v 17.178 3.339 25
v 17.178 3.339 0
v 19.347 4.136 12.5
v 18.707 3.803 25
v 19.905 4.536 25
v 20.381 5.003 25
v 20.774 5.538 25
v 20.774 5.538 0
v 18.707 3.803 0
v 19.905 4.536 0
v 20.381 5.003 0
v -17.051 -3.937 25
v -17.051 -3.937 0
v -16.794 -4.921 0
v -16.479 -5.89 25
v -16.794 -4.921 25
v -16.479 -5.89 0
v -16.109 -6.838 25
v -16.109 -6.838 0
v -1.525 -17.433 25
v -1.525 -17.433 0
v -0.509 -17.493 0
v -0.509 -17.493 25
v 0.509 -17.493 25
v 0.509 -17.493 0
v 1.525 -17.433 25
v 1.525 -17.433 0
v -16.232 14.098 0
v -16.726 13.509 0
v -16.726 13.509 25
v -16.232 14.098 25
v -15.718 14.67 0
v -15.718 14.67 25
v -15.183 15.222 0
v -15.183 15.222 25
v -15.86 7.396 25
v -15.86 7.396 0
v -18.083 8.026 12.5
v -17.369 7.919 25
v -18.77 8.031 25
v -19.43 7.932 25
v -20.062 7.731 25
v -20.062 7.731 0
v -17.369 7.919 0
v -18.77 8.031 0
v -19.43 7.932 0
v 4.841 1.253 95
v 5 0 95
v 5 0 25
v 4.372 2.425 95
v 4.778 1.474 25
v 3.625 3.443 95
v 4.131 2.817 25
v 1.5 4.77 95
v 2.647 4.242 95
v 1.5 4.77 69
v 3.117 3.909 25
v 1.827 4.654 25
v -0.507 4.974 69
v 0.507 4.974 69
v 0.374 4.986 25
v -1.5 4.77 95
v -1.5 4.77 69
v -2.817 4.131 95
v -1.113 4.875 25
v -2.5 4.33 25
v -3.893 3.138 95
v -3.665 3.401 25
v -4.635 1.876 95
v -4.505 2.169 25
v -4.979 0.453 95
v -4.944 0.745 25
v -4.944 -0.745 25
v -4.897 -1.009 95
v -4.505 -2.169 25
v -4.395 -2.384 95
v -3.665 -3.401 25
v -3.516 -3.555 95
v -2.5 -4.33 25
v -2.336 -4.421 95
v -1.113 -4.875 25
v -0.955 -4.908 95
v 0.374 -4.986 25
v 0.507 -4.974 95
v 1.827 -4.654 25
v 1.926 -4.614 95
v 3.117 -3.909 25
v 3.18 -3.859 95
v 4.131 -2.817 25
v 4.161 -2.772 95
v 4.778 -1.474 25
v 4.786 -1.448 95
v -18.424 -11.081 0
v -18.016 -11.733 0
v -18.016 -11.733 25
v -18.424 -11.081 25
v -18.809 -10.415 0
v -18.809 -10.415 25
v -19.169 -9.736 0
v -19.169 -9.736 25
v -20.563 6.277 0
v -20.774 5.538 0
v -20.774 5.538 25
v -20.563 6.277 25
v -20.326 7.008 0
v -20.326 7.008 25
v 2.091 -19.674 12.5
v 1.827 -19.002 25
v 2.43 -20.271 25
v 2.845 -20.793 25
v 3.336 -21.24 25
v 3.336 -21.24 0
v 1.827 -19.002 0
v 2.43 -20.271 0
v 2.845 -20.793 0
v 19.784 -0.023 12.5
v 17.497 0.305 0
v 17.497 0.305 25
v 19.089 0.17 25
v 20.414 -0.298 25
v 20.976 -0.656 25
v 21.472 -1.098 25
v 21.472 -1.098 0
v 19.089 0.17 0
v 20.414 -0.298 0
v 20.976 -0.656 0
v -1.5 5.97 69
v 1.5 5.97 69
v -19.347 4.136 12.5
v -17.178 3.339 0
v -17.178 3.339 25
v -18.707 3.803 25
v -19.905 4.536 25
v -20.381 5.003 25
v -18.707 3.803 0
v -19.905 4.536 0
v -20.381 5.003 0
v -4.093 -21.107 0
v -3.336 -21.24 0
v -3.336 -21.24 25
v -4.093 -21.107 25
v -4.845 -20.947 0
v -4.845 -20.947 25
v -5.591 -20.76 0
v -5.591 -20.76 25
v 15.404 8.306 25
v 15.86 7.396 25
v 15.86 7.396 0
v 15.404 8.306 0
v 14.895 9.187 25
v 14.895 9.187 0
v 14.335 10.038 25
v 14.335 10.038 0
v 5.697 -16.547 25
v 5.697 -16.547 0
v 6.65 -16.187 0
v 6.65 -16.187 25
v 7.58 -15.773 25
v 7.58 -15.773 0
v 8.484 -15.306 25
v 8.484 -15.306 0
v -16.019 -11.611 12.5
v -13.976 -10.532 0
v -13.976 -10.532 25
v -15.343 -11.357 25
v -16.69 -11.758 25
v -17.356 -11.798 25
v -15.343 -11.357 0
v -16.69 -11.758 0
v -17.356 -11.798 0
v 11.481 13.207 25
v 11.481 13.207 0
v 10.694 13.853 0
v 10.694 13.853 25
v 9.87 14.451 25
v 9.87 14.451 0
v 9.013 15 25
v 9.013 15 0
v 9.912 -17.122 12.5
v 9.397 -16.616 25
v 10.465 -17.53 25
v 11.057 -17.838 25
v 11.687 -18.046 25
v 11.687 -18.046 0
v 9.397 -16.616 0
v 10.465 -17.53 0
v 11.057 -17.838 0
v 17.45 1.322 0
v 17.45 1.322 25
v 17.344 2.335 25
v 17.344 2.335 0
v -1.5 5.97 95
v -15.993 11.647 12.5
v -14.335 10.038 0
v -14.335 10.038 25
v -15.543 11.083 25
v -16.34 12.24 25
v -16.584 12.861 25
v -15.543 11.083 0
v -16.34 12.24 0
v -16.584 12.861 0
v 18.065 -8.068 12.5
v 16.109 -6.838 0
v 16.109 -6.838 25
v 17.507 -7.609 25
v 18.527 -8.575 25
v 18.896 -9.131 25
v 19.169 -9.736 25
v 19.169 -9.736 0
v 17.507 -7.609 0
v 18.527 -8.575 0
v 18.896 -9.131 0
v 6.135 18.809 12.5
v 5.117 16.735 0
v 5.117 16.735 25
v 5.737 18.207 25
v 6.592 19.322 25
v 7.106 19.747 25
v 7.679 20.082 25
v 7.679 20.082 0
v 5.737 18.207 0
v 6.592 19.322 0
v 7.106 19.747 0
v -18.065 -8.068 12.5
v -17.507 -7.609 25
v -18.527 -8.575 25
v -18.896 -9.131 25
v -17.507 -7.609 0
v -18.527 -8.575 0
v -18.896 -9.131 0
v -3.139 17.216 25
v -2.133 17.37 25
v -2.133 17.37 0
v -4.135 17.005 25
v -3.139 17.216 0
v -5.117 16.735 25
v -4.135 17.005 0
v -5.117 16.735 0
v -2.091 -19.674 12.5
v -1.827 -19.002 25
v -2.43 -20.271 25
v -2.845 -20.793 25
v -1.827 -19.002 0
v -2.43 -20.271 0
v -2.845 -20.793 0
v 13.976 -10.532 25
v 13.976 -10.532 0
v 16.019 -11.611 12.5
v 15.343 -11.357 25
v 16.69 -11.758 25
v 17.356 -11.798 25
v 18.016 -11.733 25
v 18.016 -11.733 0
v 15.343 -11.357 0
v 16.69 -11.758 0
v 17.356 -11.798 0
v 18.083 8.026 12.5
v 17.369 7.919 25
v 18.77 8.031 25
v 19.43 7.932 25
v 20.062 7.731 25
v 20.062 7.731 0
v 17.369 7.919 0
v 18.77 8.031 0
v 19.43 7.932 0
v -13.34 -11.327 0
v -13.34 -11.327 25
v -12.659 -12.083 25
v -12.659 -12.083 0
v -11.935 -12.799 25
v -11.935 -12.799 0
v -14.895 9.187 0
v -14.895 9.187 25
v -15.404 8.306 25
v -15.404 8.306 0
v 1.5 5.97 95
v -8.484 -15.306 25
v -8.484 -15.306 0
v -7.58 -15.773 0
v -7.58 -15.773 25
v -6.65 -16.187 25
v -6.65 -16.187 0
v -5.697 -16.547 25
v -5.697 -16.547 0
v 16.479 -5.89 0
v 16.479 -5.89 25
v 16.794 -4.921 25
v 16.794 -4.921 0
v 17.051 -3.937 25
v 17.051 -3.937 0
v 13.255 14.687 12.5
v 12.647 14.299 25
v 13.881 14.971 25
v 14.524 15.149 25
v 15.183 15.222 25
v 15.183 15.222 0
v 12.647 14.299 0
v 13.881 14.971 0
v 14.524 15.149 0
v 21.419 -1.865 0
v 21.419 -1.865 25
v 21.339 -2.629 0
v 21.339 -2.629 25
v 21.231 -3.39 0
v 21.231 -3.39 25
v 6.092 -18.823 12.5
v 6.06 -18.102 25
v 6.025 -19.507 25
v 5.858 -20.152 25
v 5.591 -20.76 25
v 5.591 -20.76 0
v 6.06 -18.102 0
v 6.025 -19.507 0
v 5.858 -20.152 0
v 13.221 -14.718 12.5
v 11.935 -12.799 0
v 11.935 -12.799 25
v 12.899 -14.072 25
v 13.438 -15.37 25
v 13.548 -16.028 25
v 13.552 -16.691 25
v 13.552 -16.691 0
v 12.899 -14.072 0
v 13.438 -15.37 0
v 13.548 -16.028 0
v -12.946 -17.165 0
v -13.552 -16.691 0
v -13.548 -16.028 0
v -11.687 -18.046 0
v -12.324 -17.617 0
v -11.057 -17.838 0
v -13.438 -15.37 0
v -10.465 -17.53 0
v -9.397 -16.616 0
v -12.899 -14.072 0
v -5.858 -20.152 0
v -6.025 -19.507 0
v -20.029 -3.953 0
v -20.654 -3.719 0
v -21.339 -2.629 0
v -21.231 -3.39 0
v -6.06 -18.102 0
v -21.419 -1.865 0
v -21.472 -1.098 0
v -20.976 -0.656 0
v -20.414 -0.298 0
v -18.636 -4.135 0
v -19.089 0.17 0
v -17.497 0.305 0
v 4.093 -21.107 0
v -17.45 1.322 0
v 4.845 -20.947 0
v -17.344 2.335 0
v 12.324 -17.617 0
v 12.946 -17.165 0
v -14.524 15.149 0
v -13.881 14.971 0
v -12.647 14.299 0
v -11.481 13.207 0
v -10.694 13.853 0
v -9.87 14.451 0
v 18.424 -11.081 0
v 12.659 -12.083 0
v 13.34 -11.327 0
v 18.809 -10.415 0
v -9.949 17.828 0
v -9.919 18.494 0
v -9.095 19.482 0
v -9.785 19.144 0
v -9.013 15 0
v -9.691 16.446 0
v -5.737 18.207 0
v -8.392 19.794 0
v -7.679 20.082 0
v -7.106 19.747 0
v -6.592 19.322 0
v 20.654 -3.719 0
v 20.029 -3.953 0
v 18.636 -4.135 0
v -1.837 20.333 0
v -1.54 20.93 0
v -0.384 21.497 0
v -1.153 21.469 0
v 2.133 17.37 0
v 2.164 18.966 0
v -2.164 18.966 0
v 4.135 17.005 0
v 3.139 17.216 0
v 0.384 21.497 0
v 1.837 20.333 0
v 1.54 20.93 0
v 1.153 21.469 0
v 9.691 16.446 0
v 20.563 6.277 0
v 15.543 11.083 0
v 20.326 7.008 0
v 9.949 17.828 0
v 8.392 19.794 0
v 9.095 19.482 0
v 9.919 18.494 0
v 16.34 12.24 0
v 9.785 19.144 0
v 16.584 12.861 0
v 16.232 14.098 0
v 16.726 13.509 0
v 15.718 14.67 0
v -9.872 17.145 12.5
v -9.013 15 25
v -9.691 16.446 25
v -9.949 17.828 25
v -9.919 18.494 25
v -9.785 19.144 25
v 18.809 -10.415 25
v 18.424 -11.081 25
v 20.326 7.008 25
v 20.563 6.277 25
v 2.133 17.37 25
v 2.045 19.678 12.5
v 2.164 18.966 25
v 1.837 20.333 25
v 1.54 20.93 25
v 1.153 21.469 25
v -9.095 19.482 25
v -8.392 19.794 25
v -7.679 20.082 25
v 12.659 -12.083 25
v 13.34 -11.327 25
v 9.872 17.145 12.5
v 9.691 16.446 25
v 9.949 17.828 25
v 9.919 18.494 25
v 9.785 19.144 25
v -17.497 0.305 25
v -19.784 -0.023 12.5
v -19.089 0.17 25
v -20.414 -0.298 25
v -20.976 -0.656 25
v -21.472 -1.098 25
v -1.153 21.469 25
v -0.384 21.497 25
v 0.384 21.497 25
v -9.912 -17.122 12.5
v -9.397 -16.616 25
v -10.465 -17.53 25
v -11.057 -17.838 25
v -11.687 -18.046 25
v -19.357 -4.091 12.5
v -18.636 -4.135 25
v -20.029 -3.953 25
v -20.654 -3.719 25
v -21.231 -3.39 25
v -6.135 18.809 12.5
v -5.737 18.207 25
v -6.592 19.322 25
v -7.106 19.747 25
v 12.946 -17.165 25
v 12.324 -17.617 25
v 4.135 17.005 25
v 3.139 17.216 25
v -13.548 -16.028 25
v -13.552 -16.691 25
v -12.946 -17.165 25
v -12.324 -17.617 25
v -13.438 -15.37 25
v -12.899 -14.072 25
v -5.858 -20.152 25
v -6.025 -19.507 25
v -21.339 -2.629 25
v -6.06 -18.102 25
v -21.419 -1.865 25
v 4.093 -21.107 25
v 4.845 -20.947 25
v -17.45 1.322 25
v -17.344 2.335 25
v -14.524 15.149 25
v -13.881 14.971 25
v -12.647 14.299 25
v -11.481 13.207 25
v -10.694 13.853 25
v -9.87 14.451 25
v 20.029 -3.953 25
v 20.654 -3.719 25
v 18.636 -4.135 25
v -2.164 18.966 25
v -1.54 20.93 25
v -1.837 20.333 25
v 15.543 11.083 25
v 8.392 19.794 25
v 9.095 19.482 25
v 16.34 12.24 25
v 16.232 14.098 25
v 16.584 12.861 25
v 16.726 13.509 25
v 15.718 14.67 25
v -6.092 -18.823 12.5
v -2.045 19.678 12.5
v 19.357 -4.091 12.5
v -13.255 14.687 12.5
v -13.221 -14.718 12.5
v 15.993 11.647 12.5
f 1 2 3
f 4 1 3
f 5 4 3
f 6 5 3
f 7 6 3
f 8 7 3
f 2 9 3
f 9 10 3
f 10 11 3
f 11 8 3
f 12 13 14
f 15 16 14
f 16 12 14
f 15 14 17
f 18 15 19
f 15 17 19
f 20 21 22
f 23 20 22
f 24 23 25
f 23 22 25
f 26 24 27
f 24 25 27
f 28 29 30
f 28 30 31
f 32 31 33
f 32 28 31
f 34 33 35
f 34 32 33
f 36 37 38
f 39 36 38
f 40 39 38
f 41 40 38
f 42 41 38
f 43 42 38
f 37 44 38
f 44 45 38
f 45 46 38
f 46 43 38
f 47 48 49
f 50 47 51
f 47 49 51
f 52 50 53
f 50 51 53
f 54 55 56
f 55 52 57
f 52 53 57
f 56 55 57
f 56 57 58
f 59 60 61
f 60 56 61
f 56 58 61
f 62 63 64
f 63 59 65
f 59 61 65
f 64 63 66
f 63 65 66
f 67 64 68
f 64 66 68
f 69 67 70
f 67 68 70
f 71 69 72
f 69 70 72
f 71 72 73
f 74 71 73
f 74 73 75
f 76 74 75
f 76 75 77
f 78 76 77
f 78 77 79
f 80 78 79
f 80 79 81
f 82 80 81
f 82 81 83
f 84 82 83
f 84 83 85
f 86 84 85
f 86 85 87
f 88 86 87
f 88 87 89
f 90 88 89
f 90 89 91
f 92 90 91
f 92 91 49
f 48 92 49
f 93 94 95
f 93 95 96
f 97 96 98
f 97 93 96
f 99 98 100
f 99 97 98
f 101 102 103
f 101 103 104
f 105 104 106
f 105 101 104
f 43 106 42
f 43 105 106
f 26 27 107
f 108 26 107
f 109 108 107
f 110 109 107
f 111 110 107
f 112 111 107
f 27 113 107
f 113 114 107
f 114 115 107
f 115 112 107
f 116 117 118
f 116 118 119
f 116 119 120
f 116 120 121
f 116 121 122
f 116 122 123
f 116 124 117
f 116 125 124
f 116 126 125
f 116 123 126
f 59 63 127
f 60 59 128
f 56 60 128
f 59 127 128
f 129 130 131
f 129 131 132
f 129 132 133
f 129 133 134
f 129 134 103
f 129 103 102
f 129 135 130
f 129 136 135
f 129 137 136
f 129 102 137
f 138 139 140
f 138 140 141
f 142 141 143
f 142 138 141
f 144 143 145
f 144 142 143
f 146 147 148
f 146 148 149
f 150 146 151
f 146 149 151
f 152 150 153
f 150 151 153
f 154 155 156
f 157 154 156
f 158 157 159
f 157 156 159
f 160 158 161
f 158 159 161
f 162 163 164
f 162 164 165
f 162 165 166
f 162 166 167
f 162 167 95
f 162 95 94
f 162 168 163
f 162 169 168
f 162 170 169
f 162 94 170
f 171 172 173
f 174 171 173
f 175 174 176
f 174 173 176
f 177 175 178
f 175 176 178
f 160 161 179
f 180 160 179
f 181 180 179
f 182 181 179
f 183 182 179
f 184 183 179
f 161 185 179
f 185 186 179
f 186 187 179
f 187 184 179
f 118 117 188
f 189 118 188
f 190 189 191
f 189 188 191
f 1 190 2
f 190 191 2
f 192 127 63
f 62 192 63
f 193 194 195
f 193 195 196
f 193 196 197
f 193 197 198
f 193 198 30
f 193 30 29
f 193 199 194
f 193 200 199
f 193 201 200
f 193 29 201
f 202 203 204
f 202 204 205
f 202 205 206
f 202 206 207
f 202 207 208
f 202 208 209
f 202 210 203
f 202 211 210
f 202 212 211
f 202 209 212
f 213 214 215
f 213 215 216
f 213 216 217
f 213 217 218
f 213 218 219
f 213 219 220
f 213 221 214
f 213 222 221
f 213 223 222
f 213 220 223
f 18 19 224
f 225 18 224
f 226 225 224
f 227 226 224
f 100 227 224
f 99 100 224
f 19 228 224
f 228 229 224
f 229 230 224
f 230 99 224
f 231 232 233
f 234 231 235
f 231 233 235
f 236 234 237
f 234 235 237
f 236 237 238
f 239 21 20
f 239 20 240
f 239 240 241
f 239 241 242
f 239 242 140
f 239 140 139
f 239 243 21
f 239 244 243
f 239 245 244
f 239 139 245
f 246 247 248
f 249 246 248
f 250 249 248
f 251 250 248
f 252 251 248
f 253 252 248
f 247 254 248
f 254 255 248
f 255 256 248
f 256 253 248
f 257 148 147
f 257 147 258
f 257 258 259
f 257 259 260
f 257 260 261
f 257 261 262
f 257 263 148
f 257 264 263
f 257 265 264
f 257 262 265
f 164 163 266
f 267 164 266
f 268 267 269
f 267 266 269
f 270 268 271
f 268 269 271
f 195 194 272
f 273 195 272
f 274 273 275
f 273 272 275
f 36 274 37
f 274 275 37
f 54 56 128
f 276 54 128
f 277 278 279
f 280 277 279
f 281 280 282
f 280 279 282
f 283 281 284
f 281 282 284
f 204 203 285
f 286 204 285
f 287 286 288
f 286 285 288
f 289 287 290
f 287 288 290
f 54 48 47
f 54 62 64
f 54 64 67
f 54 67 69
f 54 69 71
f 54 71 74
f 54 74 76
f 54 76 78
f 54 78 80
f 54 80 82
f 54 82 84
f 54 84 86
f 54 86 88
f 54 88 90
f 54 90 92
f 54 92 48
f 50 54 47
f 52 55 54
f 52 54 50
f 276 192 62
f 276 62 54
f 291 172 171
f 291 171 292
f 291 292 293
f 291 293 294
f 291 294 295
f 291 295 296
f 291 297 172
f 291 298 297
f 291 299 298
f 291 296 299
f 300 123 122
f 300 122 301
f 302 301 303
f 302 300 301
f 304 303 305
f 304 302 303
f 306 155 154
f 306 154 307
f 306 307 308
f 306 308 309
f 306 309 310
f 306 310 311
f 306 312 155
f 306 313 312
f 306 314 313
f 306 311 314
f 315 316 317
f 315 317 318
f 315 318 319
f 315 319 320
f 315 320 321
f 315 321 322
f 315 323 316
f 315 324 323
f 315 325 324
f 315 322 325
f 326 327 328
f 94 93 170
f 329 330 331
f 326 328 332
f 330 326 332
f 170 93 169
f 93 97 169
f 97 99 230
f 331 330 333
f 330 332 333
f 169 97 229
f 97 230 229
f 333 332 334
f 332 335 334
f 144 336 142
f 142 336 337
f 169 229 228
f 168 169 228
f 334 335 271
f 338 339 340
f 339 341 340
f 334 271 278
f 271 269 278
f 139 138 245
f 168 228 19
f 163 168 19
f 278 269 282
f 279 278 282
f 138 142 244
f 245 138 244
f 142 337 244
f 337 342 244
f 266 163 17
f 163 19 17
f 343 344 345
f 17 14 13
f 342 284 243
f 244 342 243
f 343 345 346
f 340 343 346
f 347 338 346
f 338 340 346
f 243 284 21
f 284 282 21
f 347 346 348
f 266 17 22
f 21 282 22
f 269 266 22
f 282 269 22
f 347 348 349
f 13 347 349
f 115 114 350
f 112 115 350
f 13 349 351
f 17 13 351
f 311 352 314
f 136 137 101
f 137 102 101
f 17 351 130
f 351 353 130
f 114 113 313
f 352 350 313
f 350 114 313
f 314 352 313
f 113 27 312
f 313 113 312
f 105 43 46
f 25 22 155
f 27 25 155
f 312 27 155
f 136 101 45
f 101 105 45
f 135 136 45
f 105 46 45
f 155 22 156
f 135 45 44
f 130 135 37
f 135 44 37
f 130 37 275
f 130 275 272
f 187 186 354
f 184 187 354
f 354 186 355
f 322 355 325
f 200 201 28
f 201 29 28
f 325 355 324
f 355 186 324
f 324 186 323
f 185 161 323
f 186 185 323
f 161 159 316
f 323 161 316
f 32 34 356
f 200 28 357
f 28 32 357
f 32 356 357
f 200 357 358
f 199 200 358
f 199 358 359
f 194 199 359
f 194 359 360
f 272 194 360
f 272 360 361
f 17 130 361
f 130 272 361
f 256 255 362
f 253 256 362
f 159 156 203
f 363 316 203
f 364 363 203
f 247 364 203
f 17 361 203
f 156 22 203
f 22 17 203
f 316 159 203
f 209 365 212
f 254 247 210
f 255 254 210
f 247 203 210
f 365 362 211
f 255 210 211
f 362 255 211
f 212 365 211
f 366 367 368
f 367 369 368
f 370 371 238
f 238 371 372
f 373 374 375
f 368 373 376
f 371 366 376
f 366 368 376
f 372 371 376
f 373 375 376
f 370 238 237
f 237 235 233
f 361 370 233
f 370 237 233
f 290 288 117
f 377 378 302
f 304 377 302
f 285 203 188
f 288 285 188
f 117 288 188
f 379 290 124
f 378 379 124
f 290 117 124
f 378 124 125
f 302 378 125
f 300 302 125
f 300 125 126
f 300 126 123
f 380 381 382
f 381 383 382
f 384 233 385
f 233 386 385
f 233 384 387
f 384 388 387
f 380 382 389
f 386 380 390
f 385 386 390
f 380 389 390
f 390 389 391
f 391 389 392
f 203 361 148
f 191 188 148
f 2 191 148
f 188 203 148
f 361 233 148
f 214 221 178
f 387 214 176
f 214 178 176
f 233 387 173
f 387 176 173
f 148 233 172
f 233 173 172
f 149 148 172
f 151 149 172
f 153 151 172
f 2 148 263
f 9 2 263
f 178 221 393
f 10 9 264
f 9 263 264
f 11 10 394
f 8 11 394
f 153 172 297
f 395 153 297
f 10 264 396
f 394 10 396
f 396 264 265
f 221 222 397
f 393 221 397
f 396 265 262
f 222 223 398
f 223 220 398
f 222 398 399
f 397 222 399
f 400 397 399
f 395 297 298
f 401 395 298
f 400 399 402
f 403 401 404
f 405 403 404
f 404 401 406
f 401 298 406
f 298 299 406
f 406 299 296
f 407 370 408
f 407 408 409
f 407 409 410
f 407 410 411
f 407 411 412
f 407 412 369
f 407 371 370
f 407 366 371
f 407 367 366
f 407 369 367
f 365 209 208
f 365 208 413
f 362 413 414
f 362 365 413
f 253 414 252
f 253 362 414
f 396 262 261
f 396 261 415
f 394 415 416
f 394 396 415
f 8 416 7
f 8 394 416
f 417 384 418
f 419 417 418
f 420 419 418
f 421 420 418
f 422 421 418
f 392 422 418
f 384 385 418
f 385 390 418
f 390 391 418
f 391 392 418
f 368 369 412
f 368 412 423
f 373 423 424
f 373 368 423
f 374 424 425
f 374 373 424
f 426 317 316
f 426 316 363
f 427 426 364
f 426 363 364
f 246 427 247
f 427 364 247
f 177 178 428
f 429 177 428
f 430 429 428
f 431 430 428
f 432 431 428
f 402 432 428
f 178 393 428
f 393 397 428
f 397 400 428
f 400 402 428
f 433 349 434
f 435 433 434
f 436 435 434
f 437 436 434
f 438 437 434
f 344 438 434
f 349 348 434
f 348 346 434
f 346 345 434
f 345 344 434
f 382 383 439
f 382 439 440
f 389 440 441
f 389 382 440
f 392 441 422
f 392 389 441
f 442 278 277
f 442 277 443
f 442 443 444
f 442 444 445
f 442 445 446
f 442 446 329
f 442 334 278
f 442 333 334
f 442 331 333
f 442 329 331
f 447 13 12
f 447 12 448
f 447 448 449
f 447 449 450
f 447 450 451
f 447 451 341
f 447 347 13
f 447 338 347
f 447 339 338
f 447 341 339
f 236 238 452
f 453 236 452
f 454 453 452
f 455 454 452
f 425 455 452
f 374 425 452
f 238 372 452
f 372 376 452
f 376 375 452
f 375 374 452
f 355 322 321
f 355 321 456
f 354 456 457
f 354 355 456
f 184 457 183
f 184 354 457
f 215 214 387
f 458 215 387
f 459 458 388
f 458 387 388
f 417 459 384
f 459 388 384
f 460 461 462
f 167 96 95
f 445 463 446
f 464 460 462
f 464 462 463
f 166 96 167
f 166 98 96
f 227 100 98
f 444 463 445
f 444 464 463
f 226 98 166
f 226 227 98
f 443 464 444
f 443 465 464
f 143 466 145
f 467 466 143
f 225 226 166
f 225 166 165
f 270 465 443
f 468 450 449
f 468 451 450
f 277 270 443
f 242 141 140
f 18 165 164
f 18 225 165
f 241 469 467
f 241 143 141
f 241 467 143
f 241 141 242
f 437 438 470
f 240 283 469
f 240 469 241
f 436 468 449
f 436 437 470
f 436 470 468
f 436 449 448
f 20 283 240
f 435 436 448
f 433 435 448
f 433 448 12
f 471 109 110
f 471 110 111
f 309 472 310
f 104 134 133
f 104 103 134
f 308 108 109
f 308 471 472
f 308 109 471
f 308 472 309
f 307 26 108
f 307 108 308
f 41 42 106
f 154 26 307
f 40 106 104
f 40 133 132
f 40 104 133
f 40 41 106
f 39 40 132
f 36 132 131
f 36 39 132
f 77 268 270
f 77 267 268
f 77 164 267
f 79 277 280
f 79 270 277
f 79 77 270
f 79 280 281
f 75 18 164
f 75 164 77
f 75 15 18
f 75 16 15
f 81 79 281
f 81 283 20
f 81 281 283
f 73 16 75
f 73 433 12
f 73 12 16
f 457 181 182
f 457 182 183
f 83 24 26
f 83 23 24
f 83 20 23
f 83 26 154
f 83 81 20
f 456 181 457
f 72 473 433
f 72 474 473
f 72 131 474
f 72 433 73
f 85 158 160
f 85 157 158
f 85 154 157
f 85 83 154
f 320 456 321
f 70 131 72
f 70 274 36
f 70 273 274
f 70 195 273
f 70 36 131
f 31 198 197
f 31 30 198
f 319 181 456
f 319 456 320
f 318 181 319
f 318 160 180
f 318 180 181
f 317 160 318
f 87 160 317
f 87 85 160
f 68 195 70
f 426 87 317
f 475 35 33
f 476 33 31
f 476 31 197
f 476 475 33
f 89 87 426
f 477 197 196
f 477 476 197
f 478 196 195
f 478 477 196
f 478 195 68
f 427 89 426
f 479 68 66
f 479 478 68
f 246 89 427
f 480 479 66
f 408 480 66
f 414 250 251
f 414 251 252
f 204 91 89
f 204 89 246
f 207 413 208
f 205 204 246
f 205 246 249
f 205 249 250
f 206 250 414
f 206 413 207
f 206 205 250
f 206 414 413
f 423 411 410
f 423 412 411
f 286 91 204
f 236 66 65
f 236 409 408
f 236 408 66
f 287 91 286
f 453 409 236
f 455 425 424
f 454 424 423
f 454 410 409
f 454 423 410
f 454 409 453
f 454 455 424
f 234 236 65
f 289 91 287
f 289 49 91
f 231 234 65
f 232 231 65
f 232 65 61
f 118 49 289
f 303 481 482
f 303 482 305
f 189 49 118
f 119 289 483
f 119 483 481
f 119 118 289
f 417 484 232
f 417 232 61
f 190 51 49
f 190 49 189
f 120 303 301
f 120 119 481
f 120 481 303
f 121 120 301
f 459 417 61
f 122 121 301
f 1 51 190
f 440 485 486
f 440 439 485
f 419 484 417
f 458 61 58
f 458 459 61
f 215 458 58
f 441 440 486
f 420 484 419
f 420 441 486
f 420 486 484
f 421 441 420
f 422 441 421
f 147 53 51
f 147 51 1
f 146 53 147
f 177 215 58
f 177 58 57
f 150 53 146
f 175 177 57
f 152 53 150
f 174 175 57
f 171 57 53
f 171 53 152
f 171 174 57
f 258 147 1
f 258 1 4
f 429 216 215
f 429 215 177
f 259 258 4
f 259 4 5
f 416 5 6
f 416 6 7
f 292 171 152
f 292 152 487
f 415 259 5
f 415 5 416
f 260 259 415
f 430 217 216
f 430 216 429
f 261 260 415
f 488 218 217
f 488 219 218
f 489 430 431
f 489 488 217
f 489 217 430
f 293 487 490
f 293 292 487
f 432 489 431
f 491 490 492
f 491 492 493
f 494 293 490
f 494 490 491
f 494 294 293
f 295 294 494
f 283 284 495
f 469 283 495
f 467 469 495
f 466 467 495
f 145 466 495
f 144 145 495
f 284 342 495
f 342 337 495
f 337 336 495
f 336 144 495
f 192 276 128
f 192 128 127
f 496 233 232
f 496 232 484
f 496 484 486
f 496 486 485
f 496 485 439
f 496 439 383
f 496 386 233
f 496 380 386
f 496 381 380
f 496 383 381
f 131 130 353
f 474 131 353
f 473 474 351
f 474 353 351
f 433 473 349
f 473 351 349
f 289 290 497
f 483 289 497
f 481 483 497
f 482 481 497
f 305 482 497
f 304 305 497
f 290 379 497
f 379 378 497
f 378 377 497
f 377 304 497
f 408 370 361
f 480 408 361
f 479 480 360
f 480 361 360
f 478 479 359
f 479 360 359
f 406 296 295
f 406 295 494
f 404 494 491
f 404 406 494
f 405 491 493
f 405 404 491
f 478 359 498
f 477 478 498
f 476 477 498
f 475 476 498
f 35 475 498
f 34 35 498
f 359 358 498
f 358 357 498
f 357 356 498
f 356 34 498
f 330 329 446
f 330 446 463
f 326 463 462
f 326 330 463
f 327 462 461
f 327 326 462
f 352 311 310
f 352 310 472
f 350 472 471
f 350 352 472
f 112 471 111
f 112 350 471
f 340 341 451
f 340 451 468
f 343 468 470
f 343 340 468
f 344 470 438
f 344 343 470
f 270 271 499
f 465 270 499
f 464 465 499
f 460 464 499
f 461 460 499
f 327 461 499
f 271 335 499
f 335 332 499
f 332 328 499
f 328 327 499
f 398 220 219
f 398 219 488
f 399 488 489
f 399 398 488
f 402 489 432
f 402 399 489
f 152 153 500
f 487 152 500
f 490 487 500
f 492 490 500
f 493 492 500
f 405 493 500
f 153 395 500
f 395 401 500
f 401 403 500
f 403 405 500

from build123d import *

# Parameters (mm, degrees)
SKETCH_2_R               = 17.5
EXTRUDE_2_DEPTH          = 25
EXTRUDE_3_DEPTH          = 25
PATTERN_CIRCULAR_1_COUNT = 15
SKETCH_3_R               = 5
EXTRUDE_4_DEPTH          = 70
EXTRUDE_START            = -26
EXTRUDE_5_DEPTH          = 26


with BuildPart() as part:
    # 草图2 → 凸台-拉伸2 (new body)
    with BuildSketch(Plane.XY):
        Circle(SKETCH_2_R)
    extrude(amount=EXTRUDE_2_DEPTH)

    # 草图4 → 凸台-拉伸3 (add)
    with BuildSketch(Plane(origin=(0, 0, 0), x_dir=(-1, 0, 0), z_dir=(0, 0, -1))):
        with BuildLine():
            ThreePointArc((1.152655242, 21.469079764), (0, 21.5), (-1.152655242, 21.469079764))
            add(Edge.make_bspline(
                [(-2.13271351, 17.369557654), (-2.448019627, 19.937519908), (-1.152655242, 21.469079764)],
                knots=[0, 0, 0, 0.686911927, 0.686911927, 0.686911927], degree=2))
            ThreePointArc((-2.13271351, 17.369557654), (0, 17.5), (2.13271351, 17.369557654))
            add(Edge.make_bspline(
                [(2.13271351, 17.369557654), (2.448019627, 19.937519908), (1.152655242, 21.469079764)],
                knots=[0, 0, 0, 0.686911927, 0.686911927, 0.686911927], degree=2))
        make_face()
    extrude_3 = extrude(amount=-EXTRUDE_3_DEPTH)

    # 阵列(圆周)1: 凸台-拉伸3 ×15 about axis
    pattern_circular_1_axis = Axis((0, 0, 0), (0, 0, 1))
    for i in range(1, PATTERN_CIRCULAR_1_COUNT):
        add(extrude_3.rotate(pattern_circular_1_axis, i * 360 / PATTERN_CIRCULAR_1_COUNT))

    # 草图3 → 凸台-拉伸4 (add)
    with BuildSketch(Plane.XY.offset(25)):
        Circle(SKETCH_3_R)
    extrude(amount=EXTRUDE_4_DEPTH)

    # 草图7 → 凸台-拉伸5 (add)
    with BuildSketch(Plane.XY.offset(95).offset(EXTRUDE_START)):
        with BuildLine():
            Line((1.5, 4.769696007), (1.5, 5.969696007))
            Line((1.5, 5.969696007), (-1.5, 5.969696007))
            Line((-1.5, 5.969696007), (-1.5, 4.769696007))
            ThreePointArc((-1.5, 4.769696007), (0, 5), (1.5, 4.769696007))
        make_face()
    extrude(amount=EXTRUDE_5_DEPTH)


solid = part.part
